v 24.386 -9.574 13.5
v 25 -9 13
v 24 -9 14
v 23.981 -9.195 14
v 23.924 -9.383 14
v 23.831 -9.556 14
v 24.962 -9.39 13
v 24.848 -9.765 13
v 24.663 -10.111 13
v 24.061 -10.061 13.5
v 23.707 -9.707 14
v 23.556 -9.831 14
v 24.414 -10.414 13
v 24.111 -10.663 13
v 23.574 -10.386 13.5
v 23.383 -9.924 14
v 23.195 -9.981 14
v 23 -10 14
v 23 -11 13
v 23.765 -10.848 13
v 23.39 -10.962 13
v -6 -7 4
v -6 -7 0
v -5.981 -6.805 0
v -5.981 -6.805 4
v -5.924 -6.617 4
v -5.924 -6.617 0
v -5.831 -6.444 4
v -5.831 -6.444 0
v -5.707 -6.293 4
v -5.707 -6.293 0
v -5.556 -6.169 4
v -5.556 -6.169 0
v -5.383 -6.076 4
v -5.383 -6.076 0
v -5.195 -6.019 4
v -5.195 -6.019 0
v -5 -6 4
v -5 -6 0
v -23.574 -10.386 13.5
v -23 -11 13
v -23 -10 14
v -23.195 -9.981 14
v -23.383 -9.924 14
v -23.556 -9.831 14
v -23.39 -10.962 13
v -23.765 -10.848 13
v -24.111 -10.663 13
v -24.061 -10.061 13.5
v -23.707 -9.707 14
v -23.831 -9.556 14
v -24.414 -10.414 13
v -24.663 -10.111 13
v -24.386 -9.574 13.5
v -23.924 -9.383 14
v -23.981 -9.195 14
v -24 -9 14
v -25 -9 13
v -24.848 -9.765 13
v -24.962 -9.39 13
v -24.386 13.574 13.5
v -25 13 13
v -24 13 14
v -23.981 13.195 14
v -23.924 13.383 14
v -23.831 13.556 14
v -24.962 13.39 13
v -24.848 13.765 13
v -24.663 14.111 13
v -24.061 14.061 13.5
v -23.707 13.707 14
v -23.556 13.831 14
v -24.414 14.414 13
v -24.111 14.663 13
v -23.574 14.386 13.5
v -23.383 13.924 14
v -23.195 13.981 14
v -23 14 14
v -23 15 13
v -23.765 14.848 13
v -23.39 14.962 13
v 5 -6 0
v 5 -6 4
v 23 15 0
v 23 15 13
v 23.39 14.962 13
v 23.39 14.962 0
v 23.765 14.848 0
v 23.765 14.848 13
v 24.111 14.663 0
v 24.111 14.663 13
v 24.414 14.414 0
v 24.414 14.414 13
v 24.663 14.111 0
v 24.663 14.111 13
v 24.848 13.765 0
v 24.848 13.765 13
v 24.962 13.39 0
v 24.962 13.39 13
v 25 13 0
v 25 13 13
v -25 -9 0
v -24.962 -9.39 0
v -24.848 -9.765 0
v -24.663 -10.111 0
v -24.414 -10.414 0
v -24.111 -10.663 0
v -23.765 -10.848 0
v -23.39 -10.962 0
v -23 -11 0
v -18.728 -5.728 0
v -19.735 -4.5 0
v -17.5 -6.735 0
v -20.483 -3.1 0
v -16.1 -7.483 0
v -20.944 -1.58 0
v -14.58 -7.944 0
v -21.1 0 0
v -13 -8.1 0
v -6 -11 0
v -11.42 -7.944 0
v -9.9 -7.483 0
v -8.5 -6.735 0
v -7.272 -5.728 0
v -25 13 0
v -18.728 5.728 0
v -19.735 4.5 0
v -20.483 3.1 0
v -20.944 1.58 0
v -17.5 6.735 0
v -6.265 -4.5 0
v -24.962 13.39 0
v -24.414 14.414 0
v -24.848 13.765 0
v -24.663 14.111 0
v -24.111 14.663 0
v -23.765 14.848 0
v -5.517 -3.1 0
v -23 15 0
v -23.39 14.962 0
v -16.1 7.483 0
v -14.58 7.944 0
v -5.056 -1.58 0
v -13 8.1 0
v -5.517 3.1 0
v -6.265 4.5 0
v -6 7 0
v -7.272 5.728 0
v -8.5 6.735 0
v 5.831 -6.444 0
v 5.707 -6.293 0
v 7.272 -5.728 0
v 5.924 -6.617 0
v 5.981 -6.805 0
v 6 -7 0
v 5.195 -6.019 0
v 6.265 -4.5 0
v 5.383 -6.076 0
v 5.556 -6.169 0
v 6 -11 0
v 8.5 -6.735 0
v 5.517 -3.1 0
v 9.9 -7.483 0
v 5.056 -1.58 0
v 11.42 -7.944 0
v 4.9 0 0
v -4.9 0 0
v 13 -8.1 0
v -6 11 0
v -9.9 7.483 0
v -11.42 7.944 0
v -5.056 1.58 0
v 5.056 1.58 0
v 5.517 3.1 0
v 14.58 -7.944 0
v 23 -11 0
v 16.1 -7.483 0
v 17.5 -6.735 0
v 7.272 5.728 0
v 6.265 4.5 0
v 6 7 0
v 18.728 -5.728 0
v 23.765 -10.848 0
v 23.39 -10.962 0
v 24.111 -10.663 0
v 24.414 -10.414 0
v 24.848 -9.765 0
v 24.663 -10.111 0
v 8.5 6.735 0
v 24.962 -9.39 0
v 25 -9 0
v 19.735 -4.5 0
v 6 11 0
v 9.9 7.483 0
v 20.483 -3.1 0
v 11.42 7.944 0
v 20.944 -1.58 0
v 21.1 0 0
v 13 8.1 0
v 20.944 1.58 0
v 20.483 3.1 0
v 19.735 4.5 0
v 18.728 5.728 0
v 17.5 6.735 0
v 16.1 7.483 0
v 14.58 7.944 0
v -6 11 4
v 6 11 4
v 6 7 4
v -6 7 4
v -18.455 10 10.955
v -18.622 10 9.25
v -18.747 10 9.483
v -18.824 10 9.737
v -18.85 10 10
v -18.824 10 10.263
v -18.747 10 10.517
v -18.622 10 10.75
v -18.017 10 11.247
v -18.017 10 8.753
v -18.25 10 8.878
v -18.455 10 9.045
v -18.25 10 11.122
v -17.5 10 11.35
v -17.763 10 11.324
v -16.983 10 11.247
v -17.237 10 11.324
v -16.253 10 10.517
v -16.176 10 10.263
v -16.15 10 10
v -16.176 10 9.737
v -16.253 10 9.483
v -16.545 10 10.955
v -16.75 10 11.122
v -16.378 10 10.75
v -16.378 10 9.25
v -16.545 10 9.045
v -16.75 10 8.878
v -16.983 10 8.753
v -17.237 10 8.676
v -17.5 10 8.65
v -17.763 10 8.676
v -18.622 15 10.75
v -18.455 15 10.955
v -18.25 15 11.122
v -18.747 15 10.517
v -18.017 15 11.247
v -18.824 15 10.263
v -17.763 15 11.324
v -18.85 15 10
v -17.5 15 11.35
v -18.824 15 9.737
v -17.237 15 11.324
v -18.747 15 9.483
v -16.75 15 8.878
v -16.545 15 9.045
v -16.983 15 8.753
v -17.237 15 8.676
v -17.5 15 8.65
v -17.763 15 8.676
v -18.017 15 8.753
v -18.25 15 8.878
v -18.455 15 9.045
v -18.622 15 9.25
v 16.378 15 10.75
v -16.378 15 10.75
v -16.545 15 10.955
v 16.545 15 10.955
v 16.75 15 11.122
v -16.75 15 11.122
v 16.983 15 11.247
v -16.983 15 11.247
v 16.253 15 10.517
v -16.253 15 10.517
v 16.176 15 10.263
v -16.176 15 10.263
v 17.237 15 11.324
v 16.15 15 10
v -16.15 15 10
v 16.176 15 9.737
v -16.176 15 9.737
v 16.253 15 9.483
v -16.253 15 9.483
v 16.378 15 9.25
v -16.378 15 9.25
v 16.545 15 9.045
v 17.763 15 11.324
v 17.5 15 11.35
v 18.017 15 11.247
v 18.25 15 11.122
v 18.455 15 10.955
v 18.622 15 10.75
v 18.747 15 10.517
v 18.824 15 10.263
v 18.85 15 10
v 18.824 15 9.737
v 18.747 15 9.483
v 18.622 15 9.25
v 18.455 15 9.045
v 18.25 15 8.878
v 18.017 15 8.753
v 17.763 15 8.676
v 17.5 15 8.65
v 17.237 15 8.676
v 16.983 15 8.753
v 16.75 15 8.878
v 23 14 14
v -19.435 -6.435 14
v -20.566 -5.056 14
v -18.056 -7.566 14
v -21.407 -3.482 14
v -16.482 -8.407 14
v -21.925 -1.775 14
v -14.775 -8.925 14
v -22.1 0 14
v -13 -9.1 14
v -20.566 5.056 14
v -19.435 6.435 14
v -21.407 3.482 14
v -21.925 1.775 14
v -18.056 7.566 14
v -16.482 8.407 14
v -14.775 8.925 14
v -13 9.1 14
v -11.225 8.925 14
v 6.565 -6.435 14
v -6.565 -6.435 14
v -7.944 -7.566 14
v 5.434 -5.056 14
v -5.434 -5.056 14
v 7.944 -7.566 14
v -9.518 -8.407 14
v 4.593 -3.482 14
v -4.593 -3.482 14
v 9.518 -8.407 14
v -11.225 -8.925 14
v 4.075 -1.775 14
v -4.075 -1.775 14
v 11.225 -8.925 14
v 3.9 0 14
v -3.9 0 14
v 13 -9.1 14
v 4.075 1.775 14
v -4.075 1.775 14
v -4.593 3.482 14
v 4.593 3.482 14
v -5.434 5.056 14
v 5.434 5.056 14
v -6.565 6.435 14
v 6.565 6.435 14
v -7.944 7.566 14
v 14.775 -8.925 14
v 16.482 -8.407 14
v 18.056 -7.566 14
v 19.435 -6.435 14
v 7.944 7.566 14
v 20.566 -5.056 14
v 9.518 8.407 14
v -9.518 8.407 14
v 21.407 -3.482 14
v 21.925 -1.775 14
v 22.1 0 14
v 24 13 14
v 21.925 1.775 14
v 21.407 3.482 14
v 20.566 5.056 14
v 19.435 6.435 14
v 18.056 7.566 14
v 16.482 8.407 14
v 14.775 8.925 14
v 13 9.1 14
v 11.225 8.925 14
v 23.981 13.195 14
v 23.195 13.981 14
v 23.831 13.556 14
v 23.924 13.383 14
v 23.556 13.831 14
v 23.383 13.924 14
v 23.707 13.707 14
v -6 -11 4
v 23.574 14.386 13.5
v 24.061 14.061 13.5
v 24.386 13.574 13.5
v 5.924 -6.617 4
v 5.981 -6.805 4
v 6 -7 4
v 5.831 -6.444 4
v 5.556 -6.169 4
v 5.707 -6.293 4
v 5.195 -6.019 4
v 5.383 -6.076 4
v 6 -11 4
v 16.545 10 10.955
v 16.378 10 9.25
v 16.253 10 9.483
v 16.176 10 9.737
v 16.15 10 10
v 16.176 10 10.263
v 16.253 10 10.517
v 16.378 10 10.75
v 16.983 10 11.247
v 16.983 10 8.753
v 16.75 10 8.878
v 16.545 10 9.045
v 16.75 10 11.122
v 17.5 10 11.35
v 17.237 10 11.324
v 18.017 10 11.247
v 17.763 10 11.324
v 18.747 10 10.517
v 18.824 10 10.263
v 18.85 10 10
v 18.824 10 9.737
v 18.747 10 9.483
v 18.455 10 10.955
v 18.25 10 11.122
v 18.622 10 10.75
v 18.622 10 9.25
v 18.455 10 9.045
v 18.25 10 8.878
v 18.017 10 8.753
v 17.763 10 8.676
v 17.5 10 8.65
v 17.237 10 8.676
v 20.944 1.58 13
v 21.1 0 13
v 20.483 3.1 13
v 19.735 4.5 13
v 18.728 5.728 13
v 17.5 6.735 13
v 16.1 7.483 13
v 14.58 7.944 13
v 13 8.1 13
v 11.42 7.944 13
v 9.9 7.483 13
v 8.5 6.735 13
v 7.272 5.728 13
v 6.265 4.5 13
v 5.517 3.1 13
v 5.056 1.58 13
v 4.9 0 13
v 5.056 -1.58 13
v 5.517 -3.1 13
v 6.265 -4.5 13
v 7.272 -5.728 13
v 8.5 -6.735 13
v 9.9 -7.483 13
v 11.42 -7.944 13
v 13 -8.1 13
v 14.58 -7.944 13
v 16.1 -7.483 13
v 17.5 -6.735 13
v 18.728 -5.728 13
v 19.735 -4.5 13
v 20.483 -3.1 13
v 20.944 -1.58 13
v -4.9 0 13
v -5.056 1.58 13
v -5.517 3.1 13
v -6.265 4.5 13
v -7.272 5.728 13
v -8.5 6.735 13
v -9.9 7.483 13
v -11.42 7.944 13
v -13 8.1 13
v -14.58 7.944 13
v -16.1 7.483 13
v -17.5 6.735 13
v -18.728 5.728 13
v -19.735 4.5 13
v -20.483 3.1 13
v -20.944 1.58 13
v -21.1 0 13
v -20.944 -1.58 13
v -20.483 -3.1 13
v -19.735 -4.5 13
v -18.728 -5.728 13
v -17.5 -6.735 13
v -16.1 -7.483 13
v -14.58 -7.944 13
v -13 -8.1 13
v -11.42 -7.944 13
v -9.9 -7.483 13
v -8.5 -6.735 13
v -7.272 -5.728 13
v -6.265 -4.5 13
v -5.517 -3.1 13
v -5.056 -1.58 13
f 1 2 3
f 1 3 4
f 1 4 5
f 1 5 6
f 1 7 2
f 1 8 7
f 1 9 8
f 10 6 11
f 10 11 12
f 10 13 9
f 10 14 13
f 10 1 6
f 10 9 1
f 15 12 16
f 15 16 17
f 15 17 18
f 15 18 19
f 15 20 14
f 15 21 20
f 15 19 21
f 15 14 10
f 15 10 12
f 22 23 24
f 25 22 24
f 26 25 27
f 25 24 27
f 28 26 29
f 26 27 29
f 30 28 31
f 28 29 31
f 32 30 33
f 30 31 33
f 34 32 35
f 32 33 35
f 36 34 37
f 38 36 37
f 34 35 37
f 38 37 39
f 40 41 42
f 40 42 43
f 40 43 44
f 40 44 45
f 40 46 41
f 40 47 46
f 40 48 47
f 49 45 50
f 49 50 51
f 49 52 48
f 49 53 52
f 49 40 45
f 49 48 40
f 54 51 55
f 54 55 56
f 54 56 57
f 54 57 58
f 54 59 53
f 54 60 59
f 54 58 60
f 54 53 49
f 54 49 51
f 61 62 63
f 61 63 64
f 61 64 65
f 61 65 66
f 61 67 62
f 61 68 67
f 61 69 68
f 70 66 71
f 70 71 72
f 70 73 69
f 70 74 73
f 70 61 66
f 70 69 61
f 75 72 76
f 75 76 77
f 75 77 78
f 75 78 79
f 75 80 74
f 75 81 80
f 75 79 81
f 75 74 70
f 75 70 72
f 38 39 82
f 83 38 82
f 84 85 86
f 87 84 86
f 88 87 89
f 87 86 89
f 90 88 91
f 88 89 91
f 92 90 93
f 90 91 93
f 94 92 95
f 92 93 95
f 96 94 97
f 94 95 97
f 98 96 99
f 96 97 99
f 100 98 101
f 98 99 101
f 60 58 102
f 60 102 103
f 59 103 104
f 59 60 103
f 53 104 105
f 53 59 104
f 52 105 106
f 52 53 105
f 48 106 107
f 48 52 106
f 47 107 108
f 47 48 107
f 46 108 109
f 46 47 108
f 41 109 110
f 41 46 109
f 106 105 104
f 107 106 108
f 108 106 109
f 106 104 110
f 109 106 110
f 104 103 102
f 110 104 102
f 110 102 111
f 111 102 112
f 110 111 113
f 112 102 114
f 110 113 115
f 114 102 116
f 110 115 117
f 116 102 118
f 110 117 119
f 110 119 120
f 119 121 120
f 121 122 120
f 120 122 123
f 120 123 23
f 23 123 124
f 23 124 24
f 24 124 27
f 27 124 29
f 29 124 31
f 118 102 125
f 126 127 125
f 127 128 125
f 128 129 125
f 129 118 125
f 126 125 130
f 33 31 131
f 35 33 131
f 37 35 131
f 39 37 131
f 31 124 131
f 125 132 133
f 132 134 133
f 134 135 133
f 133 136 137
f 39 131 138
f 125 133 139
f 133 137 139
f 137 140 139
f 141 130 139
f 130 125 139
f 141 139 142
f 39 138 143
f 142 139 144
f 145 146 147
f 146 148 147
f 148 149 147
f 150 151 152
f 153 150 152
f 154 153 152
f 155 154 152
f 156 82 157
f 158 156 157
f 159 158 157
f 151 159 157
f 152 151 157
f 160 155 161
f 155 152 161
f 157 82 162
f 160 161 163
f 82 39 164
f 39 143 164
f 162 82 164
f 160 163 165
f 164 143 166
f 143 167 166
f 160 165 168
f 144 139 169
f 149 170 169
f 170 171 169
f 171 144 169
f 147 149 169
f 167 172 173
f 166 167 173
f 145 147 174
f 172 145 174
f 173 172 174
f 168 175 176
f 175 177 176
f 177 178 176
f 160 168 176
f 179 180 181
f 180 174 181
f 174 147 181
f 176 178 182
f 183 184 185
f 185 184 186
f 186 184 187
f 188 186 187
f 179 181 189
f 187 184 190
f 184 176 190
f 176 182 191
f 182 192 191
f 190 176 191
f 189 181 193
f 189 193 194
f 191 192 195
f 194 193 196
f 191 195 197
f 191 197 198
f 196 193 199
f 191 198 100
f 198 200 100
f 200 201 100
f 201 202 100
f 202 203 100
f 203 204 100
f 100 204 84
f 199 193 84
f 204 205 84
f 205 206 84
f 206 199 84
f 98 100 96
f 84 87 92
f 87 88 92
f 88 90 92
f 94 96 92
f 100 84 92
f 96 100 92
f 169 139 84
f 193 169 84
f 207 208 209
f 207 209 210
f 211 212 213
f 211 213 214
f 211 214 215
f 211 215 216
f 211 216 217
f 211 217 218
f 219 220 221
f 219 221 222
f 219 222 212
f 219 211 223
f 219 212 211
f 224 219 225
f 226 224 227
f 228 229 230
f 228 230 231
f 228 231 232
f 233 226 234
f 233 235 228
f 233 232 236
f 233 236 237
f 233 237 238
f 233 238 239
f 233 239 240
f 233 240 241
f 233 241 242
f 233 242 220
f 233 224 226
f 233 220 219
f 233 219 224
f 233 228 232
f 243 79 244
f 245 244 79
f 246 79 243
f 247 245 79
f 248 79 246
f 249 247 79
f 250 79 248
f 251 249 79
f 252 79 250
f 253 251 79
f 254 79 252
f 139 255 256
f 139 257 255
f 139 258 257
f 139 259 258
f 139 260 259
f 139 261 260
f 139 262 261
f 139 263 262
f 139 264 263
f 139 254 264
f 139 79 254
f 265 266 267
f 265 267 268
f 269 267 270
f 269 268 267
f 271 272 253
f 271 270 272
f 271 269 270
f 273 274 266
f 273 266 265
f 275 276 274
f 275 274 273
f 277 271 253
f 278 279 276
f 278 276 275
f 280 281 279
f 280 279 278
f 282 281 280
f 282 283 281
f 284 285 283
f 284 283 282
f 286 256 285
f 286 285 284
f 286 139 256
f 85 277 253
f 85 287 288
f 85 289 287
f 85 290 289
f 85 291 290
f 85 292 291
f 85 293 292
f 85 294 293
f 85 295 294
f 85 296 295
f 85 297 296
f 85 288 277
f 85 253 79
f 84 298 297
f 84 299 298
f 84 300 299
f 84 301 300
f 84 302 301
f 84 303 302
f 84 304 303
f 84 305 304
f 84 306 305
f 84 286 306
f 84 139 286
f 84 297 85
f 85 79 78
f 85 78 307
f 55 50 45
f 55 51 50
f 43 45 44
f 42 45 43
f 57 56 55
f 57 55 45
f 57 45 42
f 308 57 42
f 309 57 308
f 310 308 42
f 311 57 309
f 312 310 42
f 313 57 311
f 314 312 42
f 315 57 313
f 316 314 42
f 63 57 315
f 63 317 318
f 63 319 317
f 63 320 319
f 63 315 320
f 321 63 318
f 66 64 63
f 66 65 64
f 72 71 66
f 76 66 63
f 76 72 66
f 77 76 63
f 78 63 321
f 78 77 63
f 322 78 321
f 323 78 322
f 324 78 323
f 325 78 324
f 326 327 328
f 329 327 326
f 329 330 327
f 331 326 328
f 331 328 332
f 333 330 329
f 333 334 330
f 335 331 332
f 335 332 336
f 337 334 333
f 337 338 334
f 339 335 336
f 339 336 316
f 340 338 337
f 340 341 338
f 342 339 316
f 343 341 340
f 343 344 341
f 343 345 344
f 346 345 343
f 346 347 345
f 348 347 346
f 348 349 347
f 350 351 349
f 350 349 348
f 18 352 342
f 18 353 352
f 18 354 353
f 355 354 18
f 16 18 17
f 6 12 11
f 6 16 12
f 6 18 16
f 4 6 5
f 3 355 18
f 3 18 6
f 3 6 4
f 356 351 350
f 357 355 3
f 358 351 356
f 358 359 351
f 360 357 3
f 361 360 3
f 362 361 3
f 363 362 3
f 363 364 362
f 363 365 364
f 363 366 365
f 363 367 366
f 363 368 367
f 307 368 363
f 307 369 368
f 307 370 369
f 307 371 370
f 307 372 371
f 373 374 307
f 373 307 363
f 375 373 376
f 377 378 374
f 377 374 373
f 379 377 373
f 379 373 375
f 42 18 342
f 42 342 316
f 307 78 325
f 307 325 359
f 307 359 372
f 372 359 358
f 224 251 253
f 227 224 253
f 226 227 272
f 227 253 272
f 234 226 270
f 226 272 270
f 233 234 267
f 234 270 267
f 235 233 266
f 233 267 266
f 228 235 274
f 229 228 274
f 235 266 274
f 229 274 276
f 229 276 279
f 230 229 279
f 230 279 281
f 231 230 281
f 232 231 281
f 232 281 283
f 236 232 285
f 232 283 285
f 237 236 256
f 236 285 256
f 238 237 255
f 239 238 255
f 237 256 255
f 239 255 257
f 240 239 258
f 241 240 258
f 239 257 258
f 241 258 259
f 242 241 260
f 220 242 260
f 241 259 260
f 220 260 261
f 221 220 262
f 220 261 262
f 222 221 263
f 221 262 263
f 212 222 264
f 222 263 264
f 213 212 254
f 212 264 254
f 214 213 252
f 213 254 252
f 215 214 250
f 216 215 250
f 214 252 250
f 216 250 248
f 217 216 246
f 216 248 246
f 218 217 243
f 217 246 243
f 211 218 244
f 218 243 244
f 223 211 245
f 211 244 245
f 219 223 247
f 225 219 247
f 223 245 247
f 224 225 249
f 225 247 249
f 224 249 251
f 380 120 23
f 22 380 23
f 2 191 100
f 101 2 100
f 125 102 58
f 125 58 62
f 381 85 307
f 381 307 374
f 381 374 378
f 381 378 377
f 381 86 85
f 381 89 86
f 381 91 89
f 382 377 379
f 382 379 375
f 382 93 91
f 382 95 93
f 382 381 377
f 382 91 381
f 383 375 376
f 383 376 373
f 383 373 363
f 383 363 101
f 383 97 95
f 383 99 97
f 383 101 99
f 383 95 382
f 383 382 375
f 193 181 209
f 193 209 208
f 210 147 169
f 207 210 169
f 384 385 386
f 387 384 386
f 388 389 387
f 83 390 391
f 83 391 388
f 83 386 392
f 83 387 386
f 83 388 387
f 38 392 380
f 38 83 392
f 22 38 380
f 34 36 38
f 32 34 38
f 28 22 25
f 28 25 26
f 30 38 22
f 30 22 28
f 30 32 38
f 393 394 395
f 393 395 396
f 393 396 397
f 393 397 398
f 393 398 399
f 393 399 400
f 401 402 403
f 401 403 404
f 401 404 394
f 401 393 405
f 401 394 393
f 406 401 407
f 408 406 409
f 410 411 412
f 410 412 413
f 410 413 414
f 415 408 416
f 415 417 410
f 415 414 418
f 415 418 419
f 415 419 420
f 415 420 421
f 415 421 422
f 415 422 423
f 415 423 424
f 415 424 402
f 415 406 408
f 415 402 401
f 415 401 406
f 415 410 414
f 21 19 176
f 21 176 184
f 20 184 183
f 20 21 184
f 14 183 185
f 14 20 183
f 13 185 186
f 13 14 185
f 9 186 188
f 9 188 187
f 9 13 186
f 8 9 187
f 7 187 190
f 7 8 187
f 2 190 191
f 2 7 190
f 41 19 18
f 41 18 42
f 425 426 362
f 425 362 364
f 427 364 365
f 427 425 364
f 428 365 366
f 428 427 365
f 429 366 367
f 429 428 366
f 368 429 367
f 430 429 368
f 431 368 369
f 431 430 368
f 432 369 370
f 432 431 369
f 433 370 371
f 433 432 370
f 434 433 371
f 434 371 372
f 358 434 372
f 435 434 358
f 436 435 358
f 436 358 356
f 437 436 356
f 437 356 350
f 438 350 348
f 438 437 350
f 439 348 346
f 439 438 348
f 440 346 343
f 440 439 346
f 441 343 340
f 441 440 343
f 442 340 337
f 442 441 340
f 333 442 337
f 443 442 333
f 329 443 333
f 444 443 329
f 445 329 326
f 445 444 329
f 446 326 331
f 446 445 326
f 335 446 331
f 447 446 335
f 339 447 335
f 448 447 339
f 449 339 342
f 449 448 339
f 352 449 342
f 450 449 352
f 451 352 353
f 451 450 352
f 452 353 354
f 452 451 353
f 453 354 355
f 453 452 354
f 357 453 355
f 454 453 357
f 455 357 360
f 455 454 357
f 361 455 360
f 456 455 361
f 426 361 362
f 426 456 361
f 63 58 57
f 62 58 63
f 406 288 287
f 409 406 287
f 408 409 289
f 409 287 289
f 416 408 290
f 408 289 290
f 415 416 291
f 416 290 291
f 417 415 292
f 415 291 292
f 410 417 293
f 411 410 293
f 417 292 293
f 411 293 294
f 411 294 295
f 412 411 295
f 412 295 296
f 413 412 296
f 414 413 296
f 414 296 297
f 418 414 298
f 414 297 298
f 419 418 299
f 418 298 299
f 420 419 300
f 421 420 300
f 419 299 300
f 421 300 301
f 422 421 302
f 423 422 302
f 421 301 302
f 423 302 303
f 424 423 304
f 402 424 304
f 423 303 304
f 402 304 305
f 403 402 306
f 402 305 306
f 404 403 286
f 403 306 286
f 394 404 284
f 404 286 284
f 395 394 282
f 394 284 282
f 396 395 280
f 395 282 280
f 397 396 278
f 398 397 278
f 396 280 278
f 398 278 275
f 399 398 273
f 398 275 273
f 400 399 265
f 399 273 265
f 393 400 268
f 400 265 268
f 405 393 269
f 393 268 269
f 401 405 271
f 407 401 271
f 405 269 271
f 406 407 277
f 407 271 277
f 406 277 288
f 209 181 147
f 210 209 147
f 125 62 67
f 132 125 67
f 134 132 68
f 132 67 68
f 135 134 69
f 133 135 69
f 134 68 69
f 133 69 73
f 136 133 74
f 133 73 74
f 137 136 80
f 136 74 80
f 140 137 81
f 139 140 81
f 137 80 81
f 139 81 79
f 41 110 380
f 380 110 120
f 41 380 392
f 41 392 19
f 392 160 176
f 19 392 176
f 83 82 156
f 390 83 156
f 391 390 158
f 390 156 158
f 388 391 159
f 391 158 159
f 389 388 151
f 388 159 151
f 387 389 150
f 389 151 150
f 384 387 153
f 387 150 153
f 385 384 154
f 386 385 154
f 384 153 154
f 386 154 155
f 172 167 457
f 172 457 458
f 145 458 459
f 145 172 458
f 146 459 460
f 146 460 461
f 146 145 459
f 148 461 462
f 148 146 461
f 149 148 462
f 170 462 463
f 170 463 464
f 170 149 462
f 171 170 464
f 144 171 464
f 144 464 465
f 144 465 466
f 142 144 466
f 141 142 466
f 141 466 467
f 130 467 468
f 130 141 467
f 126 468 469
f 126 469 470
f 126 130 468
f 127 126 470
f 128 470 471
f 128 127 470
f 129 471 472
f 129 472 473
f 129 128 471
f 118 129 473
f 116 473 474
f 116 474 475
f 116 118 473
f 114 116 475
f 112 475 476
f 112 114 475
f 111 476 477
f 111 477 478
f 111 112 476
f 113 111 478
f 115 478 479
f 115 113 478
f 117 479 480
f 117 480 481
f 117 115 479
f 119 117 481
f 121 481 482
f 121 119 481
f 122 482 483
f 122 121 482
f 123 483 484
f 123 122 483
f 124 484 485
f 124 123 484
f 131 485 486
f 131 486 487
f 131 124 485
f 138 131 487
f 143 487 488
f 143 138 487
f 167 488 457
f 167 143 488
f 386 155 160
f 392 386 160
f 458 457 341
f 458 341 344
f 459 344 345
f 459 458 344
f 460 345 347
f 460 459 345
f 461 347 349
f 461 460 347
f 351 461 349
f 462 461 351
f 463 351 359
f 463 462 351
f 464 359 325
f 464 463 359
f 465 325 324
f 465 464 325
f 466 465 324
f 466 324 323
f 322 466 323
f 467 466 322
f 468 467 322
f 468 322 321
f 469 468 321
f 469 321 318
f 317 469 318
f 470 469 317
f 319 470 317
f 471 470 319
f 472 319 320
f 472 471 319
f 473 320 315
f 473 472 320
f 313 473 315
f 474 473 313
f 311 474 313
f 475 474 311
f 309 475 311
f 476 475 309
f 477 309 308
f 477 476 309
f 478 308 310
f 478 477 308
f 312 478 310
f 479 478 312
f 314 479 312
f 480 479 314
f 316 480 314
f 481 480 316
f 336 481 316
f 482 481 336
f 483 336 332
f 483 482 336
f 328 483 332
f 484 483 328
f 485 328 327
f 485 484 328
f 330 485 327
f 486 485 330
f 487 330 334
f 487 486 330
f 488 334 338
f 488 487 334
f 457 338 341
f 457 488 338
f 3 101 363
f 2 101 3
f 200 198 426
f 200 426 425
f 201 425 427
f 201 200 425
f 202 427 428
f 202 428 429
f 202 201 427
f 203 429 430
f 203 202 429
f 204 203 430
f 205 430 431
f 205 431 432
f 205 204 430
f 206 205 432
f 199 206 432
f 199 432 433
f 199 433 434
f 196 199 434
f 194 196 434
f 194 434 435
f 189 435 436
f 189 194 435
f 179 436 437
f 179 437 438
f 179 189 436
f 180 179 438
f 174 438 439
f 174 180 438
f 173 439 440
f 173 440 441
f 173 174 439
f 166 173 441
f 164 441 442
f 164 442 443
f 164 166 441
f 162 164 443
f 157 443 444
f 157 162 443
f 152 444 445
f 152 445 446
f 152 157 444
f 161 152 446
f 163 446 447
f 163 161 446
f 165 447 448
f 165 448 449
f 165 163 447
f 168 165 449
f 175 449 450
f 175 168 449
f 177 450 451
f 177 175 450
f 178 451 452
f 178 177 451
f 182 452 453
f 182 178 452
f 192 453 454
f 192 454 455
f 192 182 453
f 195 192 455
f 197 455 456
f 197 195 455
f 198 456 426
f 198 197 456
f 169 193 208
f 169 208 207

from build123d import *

# Parameters (mm, degrees)
SKETCH_1_W          = 50
SKETCH_1_H          = 26
SKETCH_1_R          = 8.1
EXTRUDE_1_DEPTH     = 14
SKETCH_2_R          = 1.35
CUT_EXTRUDE_1_DEPTH = 5
SKETCH_3_W          = 12
SKETCH_3_H          = 4
CUT_EXTRUDE_2_DEPTH = 4
CHAMFER_1_SIZE      = 1
FILLET_1_R          = 2
CHAMFER_2_SIZE      = 1


with BuildPart() as part:
    # 草图1 → 凸台-拉伸1 (new body)
    with BuildSketch(Plane.XY):
        with Locations((0, 2)):
            Rectangle(SKETCH_1_W, SKETCH_1_H)
        with Locations((13, 0)):
            Circle(SKETCH_1_R, mode=Mode.SUBTRACT)
        with Locations((-13, 0)):
            Circle(SKETCH_1_R, mode=Mode.SUBTRACT)
    extrude(amount=EXTRUDE_1_DEPTH)

    # 草图2 → 切除-拉伸1 (cut)
    with BuildSketch(Plane(origin=(0, 15, 0), x_dir=(1, 0, 0), z_dir=(0, 1, 0))):
        with Locations(Location((-17.5, -10, 0), (0, 0, 270))):
            Circle(SKETCH_2_R)
        with Locations(Location((17.5, -10, 0), (0, 0, 270))):
            Circle(SKETCH_2_R)
    extrude(amount=-CUT_EXTRUDE_1_DEPTH, mode=Mode.SUBTRACT)

    # 草图3 → 切除-拉伸2 (cut)
    with BuildSketch(Plane(origin=(0, 0, 0), x_dir=(-1, 0, 0), z_dir=(0, 0, -1))):
        with Locations((0, 9)):
            Rectangle(SKETCH_3_W, SKETCH_3_H)
        with BuildLine():
            Line((-6, -11), (6, -11))
            Line((6, -11), (6, -7))
            ThreePointArc((6, -7), (5.707106781, -6.292893219), (5, -6))
            Line((5, -6), (-5, -6))
            ThreePointArc((-5, -6), (-5.707106781, -6.292893219), (-6, -7))
            Line((-6, -7), (-6, -11))
        make_face()
    extrude(amount=-CUT_EXTRUDE_2_DEPTH, mode=Mode.SUBTRACT)

    # 倒角1
    chamfer_1_edges = [part.edges().sort_by_distance(p)[0] for p in [
        (-21.1, 0, 14),
        (4.9, 0, 14),
    ]]
    chamfer(chamfer_1_edges, length=CHAMFER_1_SIZE)

    # 圆角1
    fillet_1_edges = [part.edges().sort_by_distance(p)[0] for p in [
        (-25, 15, 7),
        (25, 15, 7),
        (25, -11, 7),
        (-25, -11, 7),
    ]]
    fillet(fillet_1_edges, radius=FILLET_1_R)

    # 倒角2
    chamfer_2_edges = [part.edges().sort_by_distance(p)[0] for p in [
        (-25, 2, 14),
        (0, 15, 14),
        (0, -11, 14),
        (25, 2, 14),
        (-24.414213562, -10.414213562, 14),
        (24.414213562, -10.414213562, 14),
        (24.414213562, 14.414213562, 14),
        (-24.414213562, 14.414213562, 14),
    ]]
    chamfer(chamfer_2_edges, length=CHAMFER_2_SIZE)


solid = part.part
